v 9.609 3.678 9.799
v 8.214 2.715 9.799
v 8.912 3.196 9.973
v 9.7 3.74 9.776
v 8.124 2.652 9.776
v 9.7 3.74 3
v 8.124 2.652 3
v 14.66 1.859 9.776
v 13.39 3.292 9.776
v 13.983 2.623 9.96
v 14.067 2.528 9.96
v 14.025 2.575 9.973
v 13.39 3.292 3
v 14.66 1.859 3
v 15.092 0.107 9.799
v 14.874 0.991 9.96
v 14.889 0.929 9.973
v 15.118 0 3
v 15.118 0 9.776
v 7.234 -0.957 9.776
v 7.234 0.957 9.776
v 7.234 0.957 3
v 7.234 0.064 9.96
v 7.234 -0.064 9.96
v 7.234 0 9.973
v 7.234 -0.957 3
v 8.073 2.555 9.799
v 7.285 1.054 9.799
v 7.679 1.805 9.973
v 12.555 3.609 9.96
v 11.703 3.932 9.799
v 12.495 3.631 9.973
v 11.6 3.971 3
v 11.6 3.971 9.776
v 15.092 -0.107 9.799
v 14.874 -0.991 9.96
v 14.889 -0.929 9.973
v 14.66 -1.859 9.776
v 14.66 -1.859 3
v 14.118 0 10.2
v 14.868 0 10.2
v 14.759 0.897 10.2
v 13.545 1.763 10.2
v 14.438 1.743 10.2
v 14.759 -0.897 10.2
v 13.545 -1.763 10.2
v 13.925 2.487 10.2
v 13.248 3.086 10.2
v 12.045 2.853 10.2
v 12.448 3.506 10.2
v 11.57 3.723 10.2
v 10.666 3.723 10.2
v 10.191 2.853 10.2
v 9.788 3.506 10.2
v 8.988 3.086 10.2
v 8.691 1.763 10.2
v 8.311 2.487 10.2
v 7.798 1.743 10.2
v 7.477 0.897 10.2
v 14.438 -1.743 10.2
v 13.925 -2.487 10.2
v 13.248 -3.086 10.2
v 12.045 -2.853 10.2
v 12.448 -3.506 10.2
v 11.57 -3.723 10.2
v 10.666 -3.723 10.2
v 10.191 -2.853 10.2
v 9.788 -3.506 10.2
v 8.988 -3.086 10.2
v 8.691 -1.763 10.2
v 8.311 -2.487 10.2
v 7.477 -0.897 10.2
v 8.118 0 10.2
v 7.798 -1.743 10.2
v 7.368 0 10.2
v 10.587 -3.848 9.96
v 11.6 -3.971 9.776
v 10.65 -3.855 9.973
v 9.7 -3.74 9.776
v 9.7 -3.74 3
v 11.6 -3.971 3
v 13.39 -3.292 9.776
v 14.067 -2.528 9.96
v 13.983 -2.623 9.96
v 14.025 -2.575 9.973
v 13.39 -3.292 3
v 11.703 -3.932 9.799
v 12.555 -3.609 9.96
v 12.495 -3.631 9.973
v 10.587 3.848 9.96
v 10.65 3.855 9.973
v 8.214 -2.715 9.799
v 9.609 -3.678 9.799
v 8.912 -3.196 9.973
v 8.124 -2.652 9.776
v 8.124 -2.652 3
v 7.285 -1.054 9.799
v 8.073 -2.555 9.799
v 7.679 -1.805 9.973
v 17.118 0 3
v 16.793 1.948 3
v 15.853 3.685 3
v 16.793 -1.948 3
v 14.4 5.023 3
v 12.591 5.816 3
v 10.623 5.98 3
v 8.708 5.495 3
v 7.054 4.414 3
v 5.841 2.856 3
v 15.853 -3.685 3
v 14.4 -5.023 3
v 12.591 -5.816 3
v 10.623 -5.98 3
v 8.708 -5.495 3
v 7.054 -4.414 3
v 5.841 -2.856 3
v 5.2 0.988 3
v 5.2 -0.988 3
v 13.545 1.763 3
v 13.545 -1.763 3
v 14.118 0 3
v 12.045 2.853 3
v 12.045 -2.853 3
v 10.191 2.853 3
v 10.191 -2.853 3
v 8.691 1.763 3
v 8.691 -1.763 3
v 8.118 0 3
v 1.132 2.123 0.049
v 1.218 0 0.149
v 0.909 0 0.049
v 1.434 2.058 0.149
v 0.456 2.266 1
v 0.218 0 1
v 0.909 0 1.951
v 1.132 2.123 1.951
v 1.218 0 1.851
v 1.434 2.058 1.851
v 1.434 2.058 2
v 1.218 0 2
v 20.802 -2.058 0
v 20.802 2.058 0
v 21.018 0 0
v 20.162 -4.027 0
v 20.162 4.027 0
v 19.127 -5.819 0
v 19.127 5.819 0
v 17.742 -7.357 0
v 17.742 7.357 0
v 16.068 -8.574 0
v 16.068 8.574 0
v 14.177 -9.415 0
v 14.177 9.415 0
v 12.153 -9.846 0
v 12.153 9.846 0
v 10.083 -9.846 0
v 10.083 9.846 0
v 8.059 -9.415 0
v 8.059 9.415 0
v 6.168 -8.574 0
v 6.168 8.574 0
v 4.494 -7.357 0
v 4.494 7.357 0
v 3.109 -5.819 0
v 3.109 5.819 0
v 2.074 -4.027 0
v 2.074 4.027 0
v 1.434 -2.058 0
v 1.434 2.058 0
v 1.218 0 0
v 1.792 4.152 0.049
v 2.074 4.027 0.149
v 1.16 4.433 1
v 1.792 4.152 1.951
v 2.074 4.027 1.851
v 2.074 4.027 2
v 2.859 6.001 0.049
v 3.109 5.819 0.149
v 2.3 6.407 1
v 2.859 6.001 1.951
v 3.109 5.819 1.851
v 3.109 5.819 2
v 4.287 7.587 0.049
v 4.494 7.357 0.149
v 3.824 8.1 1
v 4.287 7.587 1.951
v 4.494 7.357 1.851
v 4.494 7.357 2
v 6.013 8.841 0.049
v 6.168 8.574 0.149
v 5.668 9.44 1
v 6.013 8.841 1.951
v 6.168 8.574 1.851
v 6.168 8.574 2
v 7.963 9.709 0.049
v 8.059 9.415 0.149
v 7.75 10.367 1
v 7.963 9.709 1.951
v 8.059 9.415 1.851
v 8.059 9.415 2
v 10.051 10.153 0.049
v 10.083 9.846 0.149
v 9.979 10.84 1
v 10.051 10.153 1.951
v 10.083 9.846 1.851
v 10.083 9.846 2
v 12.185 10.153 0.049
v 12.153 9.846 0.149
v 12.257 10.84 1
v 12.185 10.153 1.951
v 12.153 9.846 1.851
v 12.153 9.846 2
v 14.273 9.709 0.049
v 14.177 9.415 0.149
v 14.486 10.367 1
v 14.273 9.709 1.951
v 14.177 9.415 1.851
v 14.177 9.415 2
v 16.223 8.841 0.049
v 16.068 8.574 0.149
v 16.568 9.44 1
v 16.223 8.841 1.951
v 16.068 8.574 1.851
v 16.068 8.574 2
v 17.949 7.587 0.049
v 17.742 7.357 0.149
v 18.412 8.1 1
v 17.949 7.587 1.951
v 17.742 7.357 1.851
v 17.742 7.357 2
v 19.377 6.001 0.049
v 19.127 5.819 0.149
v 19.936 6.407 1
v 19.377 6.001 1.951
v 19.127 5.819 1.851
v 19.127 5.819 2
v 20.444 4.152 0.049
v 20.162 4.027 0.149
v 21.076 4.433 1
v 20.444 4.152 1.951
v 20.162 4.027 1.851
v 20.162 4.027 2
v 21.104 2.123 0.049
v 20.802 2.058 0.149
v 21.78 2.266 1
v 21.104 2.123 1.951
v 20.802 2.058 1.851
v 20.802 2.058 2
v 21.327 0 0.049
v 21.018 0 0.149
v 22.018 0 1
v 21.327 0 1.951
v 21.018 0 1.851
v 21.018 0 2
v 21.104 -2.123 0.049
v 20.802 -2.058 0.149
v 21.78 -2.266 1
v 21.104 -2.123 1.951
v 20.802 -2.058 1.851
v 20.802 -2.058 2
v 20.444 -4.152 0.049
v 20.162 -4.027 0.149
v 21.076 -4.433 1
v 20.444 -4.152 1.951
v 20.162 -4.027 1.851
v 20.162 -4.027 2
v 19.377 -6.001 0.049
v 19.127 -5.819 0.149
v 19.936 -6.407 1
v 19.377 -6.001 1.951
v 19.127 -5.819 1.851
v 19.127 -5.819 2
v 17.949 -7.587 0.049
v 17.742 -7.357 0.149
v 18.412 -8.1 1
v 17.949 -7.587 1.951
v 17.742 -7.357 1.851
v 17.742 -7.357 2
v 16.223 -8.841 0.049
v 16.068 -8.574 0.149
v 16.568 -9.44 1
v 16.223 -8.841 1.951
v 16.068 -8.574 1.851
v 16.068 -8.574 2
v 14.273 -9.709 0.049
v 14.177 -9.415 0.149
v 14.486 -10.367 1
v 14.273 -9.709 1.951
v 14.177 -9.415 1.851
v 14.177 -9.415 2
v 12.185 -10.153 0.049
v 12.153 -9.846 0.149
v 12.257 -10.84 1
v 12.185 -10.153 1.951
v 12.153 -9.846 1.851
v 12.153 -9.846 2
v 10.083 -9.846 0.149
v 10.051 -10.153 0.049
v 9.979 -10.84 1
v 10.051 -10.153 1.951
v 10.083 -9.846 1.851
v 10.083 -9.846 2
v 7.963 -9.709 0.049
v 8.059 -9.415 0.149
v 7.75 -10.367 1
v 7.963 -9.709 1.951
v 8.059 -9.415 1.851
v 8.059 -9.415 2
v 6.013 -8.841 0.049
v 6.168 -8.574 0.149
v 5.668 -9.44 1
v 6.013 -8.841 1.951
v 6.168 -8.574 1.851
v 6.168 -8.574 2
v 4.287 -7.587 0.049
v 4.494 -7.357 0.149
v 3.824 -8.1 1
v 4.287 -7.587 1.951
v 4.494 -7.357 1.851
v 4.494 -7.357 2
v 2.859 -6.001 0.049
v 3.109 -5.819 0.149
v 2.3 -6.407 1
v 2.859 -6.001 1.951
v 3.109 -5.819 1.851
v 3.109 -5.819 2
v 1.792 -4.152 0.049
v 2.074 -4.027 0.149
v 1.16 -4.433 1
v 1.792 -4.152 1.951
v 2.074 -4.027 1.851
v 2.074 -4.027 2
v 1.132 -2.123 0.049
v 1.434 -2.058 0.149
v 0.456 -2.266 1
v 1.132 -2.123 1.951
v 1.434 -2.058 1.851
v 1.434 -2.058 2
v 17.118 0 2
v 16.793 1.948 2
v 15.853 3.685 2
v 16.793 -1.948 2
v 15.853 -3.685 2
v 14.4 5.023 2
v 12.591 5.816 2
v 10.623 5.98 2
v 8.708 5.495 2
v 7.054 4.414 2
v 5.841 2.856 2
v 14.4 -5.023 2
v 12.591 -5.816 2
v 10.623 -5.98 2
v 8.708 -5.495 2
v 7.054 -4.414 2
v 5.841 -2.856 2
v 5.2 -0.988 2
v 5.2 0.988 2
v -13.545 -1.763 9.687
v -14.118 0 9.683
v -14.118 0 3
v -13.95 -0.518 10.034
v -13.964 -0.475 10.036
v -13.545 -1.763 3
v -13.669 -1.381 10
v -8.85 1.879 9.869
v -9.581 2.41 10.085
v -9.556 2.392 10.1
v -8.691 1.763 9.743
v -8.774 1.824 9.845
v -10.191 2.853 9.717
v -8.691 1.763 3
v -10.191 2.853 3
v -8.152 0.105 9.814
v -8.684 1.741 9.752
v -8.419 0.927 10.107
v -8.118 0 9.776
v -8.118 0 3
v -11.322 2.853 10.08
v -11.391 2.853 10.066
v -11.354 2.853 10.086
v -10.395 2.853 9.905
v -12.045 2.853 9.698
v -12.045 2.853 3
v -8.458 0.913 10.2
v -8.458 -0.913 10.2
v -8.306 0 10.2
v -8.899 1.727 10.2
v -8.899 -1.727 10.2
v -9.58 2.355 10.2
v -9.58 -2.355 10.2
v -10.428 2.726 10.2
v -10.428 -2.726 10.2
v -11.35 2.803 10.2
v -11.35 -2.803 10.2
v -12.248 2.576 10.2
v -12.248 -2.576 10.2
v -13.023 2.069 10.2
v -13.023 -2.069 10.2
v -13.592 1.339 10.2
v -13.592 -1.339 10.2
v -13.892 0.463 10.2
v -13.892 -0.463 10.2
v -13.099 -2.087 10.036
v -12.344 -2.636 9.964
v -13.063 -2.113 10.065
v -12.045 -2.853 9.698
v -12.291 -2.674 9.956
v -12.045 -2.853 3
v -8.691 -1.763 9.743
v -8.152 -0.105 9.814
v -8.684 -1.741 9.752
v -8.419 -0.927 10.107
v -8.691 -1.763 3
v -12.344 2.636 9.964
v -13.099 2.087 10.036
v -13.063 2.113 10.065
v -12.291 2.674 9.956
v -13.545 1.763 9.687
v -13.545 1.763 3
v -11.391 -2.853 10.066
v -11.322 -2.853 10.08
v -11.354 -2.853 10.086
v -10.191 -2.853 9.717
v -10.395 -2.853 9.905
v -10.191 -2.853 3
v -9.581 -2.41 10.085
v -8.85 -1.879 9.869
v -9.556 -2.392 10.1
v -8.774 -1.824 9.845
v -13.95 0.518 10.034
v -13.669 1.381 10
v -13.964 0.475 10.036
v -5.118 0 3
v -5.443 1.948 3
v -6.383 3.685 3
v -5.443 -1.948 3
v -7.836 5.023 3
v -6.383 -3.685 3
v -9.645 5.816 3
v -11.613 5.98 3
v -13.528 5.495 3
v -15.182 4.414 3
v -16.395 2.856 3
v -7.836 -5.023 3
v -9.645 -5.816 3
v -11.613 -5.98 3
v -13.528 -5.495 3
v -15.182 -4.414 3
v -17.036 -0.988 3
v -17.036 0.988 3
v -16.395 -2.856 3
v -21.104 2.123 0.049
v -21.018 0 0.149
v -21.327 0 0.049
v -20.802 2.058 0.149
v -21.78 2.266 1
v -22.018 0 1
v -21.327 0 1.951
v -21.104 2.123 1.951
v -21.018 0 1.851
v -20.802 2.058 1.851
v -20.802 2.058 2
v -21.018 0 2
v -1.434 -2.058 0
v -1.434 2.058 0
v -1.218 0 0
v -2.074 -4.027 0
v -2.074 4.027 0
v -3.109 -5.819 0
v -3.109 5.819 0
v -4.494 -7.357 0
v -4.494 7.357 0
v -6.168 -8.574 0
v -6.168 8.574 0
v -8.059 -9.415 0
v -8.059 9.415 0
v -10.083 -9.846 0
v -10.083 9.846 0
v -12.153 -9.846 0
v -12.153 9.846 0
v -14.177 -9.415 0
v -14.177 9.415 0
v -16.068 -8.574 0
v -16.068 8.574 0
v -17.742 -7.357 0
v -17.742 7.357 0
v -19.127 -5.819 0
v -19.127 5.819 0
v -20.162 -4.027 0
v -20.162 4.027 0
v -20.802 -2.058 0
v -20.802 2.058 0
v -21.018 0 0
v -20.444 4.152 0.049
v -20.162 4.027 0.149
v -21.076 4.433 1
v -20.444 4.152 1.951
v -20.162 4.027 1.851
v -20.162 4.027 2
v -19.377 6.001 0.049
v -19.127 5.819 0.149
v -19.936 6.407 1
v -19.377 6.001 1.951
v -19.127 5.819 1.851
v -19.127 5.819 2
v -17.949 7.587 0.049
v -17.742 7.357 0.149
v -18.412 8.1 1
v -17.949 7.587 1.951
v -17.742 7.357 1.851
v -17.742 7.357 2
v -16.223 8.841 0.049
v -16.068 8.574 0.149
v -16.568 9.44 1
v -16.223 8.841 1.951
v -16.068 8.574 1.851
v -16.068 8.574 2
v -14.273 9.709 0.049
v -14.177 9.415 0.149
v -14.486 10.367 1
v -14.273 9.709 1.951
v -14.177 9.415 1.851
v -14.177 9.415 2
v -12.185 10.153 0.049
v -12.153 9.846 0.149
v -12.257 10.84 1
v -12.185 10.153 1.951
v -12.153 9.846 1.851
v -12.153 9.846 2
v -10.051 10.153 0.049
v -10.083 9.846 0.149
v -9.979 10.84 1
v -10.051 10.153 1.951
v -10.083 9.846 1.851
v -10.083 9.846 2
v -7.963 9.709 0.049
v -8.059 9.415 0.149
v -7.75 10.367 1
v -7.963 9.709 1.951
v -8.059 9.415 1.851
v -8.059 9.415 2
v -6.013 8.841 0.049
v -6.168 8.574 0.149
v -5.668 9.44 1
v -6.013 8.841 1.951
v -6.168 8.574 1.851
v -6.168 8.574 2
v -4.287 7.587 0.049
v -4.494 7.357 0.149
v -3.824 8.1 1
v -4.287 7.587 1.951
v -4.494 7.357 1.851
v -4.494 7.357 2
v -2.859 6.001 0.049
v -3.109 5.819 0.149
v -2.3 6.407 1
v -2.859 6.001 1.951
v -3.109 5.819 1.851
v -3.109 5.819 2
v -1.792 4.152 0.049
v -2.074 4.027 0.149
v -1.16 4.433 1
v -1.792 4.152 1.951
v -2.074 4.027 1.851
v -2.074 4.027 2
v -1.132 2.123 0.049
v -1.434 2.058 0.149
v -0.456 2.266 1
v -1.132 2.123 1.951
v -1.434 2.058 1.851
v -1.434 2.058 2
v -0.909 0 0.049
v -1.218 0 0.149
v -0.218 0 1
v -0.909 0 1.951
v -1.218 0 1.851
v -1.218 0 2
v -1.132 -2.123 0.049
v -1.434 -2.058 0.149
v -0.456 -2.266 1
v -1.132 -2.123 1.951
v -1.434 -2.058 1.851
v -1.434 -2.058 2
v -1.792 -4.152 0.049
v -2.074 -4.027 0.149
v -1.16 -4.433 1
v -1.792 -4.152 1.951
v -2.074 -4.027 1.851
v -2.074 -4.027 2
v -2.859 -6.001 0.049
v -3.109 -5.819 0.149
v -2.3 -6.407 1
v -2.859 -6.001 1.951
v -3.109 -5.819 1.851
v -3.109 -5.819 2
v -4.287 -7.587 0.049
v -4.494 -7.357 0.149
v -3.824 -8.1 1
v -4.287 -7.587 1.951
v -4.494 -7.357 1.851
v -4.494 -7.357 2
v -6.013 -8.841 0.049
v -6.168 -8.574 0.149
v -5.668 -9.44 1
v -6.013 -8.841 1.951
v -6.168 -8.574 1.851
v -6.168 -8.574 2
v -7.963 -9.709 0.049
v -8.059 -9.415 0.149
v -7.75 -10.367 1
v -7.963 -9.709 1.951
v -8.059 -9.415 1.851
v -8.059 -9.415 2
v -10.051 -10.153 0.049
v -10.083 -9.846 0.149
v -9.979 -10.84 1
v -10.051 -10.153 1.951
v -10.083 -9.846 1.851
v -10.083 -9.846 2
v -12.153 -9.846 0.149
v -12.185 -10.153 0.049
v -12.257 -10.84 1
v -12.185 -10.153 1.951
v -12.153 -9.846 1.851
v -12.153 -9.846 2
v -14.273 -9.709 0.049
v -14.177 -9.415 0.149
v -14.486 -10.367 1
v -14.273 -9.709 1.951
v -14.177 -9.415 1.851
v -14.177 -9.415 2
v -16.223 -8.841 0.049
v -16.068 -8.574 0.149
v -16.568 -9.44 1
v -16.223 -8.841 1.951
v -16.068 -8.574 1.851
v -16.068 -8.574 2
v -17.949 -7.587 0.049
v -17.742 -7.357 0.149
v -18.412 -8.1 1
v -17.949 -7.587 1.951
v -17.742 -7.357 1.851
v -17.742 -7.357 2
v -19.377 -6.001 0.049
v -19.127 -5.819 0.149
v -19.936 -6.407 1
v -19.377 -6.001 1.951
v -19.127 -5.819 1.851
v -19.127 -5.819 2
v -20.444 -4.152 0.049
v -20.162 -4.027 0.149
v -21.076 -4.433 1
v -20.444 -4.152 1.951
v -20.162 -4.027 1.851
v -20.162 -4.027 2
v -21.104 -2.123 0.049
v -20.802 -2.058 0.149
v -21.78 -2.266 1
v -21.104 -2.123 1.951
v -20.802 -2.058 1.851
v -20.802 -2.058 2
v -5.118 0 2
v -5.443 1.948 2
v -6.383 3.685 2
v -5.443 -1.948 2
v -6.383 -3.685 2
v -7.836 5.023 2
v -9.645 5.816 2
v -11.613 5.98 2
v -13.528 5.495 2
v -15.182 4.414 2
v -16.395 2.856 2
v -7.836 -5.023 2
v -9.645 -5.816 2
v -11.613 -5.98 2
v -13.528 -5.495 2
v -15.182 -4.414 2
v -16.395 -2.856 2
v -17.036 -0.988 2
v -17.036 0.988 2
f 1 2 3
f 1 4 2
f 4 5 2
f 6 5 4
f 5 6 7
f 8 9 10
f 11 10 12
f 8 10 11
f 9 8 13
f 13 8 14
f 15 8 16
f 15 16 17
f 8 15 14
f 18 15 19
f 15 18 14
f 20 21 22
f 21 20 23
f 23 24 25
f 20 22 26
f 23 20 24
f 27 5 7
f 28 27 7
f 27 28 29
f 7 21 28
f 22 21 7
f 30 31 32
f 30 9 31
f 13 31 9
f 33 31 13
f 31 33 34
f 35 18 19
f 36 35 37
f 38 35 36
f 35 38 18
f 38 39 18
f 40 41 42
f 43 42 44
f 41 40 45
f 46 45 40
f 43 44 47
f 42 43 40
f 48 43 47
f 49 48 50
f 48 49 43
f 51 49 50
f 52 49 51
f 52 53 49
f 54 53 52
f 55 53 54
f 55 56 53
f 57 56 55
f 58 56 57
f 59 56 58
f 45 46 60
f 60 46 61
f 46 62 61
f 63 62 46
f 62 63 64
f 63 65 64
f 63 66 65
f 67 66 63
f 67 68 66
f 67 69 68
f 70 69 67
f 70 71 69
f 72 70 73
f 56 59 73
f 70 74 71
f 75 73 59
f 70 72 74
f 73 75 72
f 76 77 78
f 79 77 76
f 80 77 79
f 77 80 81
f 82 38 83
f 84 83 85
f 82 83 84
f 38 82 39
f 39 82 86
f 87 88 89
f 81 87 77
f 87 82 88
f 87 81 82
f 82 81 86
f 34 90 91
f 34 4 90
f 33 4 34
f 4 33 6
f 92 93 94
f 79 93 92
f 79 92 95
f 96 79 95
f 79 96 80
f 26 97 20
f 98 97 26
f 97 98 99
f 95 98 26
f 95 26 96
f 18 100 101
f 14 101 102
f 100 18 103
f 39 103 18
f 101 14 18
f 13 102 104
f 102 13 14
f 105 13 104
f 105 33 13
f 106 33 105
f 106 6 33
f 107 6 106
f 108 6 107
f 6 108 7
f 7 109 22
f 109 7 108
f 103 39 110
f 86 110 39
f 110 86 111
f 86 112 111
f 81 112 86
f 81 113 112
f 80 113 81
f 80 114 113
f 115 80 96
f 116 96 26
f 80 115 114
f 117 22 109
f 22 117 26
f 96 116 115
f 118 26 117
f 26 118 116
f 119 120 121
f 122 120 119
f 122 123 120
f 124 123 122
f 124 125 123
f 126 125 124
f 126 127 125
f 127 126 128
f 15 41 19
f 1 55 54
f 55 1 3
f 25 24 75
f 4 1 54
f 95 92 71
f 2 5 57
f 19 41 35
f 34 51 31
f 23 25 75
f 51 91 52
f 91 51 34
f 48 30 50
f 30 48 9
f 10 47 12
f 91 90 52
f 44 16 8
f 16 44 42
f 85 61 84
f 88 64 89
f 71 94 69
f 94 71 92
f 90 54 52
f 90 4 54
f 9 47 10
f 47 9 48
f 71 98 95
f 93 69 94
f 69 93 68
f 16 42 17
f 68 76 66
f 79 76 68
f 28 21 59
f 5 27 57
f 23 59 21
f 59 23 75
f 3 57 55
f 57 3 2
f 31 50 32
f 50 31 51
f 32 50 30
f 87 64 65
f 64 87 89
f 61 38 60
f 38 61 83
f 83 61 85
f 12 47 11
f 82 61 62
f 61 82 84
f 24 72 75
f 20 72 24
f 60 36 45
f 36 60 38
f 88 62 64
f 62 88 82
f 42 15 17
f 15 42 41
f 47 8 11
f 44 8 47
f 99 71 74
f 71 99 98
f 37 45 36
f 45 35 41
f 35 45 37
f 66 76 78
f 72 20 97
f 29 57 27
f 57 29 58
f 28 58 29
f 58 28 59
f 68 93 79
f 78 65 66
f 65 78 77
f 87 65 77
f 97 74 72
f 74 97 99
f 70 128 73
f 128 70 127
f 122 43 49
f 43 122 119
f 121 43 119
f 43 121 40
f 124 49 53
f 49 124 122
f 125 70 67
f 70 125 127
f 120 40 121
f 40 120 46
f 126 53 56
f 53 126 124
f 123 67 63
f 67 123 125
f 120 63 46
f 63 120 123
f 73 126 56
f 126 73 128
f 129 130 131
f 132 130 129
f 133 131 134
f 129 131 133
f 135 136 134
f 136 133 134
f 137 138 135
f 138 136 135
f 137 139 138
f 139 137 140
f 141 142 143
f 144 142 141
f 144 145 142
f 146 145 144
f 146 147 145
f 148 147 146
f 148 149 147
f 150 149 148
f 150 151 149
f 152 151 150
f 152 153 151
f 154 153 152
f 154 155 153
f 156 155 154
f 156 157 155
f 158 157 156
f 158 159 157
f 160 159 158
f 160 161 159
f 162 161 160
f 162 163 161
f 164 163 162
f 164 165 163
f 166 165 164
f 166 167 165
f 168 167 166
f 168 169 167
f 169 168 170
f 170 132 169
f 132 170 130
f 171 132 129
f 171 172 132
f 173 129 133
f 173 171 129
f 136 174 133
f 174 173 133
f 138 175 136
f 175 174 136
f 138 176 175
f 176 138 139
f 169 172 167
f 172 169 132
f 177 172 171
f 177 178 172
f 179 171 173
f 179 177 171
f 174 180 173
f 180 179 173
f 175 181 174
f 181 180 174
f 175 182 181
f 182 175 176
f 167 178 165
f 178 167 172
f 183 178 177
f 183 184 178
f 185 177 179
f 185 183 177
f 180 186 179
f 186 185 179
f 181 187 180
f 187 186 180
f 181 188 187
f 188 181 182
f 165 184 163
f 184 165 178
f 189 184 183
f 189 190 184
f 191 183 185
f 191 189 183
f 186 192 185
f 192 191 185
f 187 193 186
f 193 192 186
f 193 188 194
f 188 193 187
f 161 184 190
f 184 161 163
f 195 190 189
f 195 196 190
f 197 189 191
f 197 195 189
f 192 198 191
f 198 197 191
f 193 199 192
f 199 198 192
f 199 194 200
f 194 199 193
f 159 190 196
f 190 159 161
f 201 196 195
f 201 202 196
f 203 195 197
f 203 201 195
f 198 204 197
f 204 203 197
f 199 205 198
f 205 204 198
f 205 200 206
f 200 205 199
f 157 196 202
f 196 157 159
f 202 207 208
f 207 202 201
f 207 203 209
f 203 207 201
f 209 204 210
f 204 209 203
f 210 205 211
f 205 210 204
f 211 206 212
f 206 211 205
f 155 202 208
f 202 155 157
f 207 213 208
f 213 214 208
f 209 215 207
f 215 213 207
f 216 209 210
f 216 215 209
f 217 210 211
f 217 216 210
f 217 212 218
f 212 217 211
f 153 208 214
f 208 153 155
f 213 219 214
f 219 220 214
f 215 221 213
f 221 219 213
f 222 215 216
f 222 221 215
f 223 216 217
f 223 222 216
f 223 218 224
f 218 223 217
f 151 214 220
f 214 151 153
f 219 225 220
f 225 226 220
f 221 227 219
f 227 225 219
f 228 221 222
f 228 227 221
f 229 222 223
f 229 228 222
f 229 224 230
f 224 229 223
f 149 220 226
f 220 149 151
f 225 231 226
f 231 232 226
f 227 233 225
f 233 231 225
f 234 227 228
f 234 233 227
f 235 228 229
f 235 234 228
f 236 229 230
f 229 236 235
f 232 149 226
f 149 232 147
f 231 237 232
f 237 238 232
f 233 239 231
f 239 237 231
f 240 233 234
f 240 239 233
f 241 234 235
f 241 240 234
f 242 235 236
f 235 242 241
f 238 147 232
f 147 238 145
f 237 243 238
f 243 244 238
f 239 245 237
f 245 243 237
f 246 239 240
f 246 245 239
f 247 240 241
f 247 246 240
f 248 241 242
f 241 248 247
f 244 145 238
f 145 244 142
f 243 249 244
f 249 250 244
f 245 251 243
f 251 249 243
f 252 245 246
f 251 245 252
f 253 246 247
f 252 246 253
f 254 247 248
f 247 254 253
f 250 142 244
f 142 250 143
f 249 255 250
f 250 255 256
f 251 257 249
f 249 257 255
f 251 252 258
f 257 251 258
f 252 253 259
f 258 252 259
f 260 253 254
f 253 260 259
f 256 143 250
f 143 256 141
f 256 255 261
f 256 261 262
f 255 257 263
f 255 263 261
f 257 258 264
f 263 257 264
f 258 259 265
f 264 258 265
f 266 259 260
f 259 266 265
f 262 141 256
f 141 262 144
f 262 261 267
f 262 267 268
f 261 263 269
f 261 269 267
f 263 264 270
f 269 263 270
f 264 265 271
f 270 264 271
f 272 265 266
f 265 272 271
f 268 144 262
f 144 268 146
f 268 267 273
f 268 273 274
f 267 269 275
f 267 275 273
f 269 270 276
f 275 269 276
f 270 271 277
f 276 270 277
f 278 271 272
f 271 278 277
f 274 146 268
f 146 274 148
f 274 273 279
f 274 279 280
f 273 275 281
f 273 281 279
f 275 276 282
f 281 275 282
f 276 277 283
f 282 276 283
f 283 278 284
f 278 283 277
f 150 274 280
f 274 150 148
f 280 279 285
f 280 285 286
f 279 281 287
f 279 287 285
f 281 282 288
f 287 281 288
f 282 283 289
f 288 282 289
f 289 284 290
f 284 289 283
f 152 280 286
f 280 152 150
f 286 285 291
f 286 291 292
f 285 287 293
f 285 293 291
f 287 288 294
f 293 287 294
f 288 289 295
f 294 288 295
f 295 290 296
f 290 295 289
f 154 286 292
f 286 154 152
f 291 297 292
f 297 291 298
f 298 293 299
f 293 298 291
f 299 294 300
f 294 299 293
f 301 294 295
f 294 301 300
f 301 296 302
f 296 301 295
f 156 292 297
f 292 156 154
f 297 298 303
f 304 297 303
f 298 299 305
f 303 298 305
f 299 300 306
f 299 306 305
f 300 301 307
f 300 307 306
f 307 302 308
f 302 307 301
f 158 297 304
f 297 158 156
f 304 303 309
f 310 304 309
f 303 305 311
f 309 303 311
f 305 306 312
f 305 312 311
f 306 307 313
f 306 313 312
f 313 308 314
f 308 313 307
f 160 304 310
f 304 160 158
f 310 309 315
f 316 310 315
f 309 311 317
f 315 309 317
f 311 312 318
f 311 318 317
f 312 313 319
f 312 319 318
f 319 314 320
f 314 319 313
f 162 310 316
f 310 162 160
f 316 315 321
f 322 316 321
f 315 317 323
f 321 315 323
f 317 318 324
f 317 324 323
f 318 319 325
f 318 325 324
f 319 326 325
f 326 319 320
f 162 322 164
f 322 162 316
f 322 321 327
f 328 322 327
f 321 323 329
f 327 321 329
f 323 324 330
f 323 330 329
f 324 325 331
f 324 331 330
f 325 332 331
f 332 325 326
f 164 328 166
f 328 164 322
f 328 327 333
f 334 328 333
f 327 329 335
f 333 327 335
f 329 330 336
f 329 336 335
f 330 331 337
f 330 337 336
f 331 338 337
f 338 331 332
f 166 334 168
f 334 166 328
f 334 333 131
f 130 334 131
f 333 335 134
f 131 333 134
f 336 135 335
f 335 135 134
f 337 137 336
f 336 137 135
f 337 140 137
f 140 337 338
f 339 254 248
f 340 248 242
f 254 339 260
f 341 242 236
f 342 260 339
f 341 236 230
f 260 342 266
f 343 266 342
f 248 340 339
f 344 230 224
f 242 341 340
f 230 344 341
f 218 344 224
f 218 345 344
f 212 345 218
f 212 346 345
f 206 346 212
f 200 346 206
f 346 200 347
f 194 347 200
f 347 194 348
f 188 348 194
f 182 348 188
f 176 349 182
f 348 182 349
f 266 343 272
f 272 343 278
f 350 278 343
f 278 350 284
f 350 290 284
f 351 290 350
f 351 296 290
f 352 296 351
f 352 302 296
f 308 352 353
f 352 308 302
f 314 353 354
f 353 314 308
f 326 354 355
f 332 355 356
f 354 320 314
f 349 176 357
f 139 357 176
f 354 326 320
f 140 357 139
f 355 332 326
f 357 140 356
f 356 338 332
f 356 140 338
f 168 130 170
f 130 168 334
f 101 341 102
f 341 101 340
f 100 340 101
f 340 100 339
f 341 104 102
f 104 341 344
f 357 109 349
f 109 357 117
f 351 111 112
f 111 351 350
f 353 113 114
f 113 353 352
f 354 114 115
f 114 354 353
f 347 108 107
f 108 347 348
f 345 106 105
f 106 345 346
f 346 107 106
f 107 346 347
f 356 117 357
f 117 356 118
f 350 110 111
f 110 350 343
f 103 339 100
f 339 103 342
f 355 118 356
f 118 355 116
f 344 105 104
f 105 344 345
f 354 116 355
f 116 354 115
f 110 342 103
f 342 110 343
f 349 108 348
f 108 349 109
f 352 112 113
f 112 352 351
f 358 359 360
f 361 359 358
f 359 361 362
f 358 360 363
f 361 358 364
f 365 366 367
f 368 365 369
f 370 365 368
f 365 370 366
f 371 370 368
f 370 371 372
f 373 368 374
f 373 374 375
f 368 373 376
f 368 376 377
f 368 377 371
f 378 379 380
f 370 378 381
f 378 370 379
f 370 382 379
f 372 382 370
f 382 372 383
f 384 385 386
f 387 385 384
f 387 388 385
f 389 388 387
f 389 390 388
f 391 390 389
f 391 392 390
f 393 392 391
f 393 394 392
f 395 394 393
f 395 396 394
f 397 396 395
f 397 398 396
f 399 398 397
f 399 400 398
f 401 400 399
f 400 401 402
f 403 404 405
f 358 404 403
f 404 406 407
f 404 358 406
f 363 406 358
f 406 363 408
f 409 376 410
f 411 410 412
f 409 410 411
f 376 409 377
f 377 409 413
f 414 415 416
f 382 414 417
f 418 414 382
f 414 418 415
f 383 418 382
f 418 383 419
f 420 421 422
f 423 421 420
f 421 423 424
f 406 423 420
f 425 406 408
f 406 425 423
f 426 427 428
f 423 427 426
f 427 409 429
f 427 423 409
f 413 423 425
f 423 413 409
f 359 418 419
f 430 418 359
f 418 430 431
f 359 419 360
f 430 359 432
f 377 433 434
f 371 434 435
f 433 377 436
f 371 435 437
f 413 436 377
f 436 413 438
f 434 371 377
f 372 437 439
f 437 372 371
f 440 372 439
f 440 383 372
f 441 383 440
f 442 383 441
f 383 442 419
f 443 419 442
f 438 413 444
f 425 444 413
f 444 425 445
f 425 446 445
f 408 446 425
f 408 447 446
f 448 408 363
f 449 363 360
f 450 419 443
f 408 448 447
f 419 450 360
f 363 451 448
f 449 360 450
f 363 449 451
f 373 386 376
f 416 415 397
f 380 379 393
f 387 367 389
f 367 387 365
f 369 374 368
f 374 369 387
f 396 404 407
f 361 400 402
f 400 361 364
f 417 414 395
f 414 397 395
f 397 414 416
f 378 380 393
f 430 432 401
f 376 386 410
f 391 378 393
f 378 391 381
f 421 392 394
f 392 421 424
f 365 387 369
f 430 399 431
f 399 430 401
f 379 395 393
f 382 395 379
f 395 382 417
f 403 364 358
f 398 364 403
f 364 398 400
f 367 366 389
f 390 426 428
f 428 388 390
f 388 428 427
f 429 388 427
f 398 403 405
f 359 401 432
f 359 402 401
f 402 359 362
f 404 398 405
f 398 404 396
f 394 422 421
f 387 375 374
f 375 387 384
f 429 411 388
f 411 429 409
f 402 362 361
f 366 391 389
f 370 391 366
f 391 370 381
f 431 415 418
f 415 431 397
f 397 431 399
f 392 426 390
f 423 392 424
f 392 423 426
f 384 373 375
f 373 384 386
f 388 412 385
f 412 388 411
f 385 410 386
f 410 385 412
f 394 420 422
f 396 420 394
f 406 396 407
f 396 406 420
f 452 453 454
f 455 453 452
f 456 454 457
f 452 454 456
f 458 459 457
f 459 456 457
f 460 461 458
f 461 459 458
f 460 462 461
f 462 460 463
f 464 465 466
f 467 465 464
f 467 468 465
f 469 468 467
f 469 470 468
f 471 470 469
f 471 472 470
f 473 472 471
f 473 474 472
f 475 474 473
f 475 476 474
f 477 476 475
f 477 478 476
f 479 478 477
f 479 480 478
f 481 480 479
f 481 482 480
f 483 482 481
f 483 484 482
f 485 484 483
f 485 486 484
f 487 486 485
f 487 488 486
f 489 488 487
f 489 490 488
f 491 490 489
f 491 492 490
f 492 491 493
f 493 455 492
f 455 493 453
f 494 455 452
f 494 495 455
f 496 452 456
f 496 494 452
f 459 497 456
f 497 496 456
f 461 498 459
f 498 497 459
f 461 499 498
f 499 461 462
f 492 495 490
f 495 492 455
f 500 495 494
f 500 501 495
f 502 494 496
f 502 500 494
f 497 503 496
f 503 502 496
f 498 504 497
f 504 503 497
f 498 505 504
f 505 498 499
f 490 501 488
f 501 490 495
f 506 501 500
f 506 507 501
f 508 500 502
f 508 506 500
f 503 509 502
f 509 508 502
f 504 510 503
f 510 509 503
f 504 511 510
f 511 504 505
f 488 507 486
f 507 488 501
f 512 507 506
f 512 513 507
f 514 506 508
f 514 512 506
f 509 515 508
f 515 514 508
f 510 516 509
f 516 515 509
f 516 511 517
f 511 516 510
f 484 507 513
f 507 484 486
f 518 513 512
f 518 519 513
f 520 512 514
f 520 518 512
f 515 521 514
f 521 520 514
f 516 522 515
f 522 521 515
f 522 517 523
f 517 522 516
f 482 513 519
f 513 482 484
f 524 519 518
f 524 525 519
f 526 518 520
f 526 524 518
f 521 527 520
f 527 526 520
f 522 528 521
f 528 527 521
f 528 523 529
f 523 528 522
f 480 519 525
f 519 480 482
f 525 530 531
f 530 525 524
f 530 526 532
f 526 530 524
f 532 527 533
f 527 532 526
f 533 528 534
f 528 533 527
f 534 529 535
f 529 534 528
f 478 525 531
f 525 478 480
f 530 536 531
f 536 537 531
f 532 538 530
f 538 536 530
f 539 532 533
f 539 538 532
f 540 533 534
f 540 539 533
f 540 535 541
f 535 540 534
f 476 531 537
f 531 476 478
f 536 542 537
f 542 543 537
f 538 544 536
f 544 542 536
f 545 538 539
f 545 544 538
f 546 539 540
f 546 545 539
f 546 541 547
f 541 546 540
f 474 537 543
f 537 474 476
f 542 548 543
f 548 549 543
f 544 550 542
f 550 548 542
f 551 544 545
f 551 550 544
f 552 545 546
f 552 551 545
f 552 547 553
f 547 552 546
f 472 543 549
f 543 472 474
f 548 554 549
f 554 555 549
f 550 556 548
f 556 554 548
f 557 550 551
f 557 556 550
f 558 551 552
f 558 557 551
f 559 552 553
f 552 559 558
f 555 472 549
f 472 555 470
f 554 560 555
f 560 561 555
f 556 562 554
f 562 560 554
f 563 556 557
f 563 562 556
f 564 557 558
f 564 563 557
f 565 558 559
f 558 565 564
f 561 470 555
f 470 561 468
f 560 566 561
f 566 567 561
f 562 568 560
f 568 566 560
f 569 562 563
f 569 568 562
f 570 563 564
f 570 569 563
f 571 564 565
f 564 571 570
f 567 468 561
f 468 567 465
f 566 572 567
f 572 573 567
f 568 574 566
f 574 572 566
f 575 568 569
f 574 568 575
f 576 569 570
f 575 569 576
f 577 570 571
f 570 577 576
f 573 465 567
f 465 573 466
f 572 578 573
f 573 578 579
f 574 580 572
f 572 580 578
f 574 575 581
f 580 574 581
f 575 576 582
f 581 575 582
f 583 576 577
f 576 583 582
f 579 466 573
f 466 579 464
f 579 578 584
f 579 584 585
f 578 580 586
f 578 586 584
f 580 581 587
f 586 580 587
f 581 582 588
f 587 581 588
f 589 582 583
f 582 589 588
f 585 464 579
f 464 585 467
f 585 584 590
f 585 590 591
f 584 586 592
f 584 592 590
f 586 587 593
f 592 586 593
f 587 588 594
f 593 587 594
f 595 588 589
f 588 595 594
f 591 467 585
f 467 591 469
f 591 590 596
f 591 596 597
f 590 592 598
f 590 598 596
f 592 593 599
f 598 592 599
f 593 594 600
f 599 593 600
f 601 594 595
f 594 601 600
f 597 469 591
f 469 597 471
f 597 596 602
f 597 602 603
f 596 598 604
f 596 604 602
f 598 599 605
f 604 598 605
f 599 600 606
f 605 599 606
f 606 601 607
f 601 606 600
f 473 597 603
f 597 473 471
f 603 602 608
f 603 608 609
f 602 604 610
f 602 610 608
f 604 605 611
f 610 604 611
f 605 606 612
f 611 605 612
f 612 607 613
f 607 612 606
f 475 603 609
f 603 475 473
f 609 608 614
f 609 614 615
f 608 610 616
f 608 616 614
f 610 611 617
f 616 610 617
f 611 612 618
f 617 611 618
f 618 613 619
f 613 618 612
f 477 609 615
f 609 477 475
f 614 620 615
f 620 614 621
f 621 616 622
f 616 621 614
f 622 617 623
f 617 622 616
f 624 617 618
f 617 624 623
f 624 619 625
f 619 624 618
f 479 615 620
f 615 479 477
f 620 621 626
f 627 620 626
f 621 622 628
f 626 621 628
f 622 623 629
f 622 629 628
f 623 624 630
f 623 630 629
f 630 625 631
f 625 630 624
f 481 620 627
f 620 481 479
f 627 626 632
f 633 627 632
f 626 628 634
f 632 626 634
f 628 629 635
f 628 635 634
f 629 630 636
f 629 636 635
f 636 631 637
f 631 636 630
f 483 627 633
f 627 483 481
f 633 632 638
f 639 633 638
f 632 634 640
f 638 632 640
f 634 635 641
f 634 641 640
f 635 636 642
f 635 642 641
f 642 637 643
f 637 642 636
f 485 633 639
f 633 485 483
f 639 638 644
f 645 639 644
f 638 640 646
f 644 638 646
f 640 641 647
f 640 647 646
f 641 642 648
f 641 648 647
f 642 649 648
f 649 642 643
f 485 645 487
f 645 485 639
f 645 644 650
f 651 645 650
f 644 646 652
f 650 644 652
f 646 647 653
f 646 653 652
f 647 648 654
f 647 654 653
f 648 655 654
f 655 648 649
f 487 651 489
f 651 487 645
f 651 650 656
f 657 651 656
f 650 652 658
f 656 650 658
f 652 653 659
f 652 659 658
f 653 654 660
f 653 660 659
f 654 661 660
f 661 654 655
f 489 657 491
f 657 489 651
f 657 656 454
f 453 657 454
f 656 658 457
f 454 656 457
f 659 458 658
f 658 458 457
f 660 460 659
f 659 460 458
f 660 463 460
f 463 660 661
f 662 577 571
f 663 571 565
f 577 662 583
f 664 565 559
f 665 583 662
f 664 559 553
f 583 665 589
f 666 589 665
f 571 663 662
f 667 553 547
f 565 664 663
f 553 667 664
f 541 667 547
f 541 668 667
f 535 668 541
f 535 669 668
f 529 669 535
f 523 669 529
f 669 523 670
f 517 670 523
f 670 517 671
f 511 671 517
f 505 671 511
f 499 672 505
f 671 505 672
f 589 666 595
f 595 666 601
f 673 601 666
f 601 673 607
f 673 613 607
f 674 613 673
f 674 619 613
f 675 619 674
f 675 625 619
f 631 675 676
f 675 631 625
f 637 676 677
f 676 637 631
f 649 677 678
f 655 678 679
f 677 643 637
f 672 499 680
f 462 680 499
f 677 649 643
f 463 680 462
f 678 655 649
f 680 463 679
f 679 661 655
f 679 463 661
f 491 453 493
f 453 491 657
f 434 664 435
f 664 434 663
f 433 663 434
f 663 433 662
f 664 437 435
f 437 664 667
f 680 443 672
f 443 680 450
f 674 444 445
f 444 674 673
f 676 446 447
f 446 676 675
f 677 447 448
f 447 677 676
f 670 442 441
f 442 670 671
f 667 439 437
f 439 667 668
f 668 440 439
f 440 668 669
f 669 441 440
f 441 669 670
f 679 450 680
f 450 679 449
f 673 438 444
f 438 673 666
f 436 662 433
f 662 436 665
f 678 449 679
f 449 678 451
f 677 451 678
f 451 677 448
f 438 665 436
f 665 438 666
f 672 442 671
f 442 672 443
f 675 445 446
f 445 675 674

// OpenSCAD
// $fn=360/2;

edge_radius=1;

nozzle_diameter=0.4;
walls=4;

grip_diameter=25-(nozzle_diameter*walls*2);
grip_radius=grip_diameter/2;
thumbprint=50;

bushing_diameter=12;
bushing_radius=bushing_diameter/2;
bushing_height=1;

bearing_inner_diameter=8;
bearing_inner_radius=bearing_inner_diameter/2;

tab_diameter=bearing_inner_diameter*3/4;//*1/2;
tab_radius=tab_diameter/2;

post_height=7.2;
bevel_factor=15/16;

module indent() {
  color("yellow") {
    translate([0,0,-thumbprint*0.98]) sphere(r=thumbprint);
  }
}

module grip_disc() {
  difference() {
    rotate_extrude() {
      translate([grip_radius-edge_radius,edge_radius,0]) circle(r=edge_radius);
      square([grip_radius-edge_radius,edge_radius*2]);
    }
    //indent();
  }
}

module planes() {
  linear_extrude(height=0.01)  square(size=100, center=true);
  translate([0,0,1]) linear_extrude(height=0.01)  square(size=100, center=true);
}

module bushing () {
  translate([0,0,edge_radius*2])
    cylinder(h=bushing_height, r=bushing_radius);
}

module slot() {
  translate([0,0,bushing_height+edge_radius*2]) {
    difference() {
        intersection() {
            cylinder(h=post_height, r=bearing_inner_radius); // slot
            cylinder(h=post_height, r1=bearing_inner_radius*2, r2=bearing_inner_radius*bevel_factor); // bevel
        }
        cylinder(h=post_height, r=tab_radius); // tab space
    }
  }
}

module tab() {
    translate([0,0,bushing_height+edge_radius*2]) {
        intersection() {
            cylinder(h=post_height, r=tab_radius); // tab
            cylinder(h=post_height, r1=tab_radius*2, r2=tab_radius*bevel_factor); // bevel
        }
    }
}

module upper_grip() {
  grip_disc();  
  bushing();
  slot();
}
translate([grip_diameter*0.51,0,0]) upper_grip();

module lower_grip() {
  grip_disc();  
  bushing();
  tab();
}
translate([-grip_diameter*0.51,0,0]) lower_grip();
